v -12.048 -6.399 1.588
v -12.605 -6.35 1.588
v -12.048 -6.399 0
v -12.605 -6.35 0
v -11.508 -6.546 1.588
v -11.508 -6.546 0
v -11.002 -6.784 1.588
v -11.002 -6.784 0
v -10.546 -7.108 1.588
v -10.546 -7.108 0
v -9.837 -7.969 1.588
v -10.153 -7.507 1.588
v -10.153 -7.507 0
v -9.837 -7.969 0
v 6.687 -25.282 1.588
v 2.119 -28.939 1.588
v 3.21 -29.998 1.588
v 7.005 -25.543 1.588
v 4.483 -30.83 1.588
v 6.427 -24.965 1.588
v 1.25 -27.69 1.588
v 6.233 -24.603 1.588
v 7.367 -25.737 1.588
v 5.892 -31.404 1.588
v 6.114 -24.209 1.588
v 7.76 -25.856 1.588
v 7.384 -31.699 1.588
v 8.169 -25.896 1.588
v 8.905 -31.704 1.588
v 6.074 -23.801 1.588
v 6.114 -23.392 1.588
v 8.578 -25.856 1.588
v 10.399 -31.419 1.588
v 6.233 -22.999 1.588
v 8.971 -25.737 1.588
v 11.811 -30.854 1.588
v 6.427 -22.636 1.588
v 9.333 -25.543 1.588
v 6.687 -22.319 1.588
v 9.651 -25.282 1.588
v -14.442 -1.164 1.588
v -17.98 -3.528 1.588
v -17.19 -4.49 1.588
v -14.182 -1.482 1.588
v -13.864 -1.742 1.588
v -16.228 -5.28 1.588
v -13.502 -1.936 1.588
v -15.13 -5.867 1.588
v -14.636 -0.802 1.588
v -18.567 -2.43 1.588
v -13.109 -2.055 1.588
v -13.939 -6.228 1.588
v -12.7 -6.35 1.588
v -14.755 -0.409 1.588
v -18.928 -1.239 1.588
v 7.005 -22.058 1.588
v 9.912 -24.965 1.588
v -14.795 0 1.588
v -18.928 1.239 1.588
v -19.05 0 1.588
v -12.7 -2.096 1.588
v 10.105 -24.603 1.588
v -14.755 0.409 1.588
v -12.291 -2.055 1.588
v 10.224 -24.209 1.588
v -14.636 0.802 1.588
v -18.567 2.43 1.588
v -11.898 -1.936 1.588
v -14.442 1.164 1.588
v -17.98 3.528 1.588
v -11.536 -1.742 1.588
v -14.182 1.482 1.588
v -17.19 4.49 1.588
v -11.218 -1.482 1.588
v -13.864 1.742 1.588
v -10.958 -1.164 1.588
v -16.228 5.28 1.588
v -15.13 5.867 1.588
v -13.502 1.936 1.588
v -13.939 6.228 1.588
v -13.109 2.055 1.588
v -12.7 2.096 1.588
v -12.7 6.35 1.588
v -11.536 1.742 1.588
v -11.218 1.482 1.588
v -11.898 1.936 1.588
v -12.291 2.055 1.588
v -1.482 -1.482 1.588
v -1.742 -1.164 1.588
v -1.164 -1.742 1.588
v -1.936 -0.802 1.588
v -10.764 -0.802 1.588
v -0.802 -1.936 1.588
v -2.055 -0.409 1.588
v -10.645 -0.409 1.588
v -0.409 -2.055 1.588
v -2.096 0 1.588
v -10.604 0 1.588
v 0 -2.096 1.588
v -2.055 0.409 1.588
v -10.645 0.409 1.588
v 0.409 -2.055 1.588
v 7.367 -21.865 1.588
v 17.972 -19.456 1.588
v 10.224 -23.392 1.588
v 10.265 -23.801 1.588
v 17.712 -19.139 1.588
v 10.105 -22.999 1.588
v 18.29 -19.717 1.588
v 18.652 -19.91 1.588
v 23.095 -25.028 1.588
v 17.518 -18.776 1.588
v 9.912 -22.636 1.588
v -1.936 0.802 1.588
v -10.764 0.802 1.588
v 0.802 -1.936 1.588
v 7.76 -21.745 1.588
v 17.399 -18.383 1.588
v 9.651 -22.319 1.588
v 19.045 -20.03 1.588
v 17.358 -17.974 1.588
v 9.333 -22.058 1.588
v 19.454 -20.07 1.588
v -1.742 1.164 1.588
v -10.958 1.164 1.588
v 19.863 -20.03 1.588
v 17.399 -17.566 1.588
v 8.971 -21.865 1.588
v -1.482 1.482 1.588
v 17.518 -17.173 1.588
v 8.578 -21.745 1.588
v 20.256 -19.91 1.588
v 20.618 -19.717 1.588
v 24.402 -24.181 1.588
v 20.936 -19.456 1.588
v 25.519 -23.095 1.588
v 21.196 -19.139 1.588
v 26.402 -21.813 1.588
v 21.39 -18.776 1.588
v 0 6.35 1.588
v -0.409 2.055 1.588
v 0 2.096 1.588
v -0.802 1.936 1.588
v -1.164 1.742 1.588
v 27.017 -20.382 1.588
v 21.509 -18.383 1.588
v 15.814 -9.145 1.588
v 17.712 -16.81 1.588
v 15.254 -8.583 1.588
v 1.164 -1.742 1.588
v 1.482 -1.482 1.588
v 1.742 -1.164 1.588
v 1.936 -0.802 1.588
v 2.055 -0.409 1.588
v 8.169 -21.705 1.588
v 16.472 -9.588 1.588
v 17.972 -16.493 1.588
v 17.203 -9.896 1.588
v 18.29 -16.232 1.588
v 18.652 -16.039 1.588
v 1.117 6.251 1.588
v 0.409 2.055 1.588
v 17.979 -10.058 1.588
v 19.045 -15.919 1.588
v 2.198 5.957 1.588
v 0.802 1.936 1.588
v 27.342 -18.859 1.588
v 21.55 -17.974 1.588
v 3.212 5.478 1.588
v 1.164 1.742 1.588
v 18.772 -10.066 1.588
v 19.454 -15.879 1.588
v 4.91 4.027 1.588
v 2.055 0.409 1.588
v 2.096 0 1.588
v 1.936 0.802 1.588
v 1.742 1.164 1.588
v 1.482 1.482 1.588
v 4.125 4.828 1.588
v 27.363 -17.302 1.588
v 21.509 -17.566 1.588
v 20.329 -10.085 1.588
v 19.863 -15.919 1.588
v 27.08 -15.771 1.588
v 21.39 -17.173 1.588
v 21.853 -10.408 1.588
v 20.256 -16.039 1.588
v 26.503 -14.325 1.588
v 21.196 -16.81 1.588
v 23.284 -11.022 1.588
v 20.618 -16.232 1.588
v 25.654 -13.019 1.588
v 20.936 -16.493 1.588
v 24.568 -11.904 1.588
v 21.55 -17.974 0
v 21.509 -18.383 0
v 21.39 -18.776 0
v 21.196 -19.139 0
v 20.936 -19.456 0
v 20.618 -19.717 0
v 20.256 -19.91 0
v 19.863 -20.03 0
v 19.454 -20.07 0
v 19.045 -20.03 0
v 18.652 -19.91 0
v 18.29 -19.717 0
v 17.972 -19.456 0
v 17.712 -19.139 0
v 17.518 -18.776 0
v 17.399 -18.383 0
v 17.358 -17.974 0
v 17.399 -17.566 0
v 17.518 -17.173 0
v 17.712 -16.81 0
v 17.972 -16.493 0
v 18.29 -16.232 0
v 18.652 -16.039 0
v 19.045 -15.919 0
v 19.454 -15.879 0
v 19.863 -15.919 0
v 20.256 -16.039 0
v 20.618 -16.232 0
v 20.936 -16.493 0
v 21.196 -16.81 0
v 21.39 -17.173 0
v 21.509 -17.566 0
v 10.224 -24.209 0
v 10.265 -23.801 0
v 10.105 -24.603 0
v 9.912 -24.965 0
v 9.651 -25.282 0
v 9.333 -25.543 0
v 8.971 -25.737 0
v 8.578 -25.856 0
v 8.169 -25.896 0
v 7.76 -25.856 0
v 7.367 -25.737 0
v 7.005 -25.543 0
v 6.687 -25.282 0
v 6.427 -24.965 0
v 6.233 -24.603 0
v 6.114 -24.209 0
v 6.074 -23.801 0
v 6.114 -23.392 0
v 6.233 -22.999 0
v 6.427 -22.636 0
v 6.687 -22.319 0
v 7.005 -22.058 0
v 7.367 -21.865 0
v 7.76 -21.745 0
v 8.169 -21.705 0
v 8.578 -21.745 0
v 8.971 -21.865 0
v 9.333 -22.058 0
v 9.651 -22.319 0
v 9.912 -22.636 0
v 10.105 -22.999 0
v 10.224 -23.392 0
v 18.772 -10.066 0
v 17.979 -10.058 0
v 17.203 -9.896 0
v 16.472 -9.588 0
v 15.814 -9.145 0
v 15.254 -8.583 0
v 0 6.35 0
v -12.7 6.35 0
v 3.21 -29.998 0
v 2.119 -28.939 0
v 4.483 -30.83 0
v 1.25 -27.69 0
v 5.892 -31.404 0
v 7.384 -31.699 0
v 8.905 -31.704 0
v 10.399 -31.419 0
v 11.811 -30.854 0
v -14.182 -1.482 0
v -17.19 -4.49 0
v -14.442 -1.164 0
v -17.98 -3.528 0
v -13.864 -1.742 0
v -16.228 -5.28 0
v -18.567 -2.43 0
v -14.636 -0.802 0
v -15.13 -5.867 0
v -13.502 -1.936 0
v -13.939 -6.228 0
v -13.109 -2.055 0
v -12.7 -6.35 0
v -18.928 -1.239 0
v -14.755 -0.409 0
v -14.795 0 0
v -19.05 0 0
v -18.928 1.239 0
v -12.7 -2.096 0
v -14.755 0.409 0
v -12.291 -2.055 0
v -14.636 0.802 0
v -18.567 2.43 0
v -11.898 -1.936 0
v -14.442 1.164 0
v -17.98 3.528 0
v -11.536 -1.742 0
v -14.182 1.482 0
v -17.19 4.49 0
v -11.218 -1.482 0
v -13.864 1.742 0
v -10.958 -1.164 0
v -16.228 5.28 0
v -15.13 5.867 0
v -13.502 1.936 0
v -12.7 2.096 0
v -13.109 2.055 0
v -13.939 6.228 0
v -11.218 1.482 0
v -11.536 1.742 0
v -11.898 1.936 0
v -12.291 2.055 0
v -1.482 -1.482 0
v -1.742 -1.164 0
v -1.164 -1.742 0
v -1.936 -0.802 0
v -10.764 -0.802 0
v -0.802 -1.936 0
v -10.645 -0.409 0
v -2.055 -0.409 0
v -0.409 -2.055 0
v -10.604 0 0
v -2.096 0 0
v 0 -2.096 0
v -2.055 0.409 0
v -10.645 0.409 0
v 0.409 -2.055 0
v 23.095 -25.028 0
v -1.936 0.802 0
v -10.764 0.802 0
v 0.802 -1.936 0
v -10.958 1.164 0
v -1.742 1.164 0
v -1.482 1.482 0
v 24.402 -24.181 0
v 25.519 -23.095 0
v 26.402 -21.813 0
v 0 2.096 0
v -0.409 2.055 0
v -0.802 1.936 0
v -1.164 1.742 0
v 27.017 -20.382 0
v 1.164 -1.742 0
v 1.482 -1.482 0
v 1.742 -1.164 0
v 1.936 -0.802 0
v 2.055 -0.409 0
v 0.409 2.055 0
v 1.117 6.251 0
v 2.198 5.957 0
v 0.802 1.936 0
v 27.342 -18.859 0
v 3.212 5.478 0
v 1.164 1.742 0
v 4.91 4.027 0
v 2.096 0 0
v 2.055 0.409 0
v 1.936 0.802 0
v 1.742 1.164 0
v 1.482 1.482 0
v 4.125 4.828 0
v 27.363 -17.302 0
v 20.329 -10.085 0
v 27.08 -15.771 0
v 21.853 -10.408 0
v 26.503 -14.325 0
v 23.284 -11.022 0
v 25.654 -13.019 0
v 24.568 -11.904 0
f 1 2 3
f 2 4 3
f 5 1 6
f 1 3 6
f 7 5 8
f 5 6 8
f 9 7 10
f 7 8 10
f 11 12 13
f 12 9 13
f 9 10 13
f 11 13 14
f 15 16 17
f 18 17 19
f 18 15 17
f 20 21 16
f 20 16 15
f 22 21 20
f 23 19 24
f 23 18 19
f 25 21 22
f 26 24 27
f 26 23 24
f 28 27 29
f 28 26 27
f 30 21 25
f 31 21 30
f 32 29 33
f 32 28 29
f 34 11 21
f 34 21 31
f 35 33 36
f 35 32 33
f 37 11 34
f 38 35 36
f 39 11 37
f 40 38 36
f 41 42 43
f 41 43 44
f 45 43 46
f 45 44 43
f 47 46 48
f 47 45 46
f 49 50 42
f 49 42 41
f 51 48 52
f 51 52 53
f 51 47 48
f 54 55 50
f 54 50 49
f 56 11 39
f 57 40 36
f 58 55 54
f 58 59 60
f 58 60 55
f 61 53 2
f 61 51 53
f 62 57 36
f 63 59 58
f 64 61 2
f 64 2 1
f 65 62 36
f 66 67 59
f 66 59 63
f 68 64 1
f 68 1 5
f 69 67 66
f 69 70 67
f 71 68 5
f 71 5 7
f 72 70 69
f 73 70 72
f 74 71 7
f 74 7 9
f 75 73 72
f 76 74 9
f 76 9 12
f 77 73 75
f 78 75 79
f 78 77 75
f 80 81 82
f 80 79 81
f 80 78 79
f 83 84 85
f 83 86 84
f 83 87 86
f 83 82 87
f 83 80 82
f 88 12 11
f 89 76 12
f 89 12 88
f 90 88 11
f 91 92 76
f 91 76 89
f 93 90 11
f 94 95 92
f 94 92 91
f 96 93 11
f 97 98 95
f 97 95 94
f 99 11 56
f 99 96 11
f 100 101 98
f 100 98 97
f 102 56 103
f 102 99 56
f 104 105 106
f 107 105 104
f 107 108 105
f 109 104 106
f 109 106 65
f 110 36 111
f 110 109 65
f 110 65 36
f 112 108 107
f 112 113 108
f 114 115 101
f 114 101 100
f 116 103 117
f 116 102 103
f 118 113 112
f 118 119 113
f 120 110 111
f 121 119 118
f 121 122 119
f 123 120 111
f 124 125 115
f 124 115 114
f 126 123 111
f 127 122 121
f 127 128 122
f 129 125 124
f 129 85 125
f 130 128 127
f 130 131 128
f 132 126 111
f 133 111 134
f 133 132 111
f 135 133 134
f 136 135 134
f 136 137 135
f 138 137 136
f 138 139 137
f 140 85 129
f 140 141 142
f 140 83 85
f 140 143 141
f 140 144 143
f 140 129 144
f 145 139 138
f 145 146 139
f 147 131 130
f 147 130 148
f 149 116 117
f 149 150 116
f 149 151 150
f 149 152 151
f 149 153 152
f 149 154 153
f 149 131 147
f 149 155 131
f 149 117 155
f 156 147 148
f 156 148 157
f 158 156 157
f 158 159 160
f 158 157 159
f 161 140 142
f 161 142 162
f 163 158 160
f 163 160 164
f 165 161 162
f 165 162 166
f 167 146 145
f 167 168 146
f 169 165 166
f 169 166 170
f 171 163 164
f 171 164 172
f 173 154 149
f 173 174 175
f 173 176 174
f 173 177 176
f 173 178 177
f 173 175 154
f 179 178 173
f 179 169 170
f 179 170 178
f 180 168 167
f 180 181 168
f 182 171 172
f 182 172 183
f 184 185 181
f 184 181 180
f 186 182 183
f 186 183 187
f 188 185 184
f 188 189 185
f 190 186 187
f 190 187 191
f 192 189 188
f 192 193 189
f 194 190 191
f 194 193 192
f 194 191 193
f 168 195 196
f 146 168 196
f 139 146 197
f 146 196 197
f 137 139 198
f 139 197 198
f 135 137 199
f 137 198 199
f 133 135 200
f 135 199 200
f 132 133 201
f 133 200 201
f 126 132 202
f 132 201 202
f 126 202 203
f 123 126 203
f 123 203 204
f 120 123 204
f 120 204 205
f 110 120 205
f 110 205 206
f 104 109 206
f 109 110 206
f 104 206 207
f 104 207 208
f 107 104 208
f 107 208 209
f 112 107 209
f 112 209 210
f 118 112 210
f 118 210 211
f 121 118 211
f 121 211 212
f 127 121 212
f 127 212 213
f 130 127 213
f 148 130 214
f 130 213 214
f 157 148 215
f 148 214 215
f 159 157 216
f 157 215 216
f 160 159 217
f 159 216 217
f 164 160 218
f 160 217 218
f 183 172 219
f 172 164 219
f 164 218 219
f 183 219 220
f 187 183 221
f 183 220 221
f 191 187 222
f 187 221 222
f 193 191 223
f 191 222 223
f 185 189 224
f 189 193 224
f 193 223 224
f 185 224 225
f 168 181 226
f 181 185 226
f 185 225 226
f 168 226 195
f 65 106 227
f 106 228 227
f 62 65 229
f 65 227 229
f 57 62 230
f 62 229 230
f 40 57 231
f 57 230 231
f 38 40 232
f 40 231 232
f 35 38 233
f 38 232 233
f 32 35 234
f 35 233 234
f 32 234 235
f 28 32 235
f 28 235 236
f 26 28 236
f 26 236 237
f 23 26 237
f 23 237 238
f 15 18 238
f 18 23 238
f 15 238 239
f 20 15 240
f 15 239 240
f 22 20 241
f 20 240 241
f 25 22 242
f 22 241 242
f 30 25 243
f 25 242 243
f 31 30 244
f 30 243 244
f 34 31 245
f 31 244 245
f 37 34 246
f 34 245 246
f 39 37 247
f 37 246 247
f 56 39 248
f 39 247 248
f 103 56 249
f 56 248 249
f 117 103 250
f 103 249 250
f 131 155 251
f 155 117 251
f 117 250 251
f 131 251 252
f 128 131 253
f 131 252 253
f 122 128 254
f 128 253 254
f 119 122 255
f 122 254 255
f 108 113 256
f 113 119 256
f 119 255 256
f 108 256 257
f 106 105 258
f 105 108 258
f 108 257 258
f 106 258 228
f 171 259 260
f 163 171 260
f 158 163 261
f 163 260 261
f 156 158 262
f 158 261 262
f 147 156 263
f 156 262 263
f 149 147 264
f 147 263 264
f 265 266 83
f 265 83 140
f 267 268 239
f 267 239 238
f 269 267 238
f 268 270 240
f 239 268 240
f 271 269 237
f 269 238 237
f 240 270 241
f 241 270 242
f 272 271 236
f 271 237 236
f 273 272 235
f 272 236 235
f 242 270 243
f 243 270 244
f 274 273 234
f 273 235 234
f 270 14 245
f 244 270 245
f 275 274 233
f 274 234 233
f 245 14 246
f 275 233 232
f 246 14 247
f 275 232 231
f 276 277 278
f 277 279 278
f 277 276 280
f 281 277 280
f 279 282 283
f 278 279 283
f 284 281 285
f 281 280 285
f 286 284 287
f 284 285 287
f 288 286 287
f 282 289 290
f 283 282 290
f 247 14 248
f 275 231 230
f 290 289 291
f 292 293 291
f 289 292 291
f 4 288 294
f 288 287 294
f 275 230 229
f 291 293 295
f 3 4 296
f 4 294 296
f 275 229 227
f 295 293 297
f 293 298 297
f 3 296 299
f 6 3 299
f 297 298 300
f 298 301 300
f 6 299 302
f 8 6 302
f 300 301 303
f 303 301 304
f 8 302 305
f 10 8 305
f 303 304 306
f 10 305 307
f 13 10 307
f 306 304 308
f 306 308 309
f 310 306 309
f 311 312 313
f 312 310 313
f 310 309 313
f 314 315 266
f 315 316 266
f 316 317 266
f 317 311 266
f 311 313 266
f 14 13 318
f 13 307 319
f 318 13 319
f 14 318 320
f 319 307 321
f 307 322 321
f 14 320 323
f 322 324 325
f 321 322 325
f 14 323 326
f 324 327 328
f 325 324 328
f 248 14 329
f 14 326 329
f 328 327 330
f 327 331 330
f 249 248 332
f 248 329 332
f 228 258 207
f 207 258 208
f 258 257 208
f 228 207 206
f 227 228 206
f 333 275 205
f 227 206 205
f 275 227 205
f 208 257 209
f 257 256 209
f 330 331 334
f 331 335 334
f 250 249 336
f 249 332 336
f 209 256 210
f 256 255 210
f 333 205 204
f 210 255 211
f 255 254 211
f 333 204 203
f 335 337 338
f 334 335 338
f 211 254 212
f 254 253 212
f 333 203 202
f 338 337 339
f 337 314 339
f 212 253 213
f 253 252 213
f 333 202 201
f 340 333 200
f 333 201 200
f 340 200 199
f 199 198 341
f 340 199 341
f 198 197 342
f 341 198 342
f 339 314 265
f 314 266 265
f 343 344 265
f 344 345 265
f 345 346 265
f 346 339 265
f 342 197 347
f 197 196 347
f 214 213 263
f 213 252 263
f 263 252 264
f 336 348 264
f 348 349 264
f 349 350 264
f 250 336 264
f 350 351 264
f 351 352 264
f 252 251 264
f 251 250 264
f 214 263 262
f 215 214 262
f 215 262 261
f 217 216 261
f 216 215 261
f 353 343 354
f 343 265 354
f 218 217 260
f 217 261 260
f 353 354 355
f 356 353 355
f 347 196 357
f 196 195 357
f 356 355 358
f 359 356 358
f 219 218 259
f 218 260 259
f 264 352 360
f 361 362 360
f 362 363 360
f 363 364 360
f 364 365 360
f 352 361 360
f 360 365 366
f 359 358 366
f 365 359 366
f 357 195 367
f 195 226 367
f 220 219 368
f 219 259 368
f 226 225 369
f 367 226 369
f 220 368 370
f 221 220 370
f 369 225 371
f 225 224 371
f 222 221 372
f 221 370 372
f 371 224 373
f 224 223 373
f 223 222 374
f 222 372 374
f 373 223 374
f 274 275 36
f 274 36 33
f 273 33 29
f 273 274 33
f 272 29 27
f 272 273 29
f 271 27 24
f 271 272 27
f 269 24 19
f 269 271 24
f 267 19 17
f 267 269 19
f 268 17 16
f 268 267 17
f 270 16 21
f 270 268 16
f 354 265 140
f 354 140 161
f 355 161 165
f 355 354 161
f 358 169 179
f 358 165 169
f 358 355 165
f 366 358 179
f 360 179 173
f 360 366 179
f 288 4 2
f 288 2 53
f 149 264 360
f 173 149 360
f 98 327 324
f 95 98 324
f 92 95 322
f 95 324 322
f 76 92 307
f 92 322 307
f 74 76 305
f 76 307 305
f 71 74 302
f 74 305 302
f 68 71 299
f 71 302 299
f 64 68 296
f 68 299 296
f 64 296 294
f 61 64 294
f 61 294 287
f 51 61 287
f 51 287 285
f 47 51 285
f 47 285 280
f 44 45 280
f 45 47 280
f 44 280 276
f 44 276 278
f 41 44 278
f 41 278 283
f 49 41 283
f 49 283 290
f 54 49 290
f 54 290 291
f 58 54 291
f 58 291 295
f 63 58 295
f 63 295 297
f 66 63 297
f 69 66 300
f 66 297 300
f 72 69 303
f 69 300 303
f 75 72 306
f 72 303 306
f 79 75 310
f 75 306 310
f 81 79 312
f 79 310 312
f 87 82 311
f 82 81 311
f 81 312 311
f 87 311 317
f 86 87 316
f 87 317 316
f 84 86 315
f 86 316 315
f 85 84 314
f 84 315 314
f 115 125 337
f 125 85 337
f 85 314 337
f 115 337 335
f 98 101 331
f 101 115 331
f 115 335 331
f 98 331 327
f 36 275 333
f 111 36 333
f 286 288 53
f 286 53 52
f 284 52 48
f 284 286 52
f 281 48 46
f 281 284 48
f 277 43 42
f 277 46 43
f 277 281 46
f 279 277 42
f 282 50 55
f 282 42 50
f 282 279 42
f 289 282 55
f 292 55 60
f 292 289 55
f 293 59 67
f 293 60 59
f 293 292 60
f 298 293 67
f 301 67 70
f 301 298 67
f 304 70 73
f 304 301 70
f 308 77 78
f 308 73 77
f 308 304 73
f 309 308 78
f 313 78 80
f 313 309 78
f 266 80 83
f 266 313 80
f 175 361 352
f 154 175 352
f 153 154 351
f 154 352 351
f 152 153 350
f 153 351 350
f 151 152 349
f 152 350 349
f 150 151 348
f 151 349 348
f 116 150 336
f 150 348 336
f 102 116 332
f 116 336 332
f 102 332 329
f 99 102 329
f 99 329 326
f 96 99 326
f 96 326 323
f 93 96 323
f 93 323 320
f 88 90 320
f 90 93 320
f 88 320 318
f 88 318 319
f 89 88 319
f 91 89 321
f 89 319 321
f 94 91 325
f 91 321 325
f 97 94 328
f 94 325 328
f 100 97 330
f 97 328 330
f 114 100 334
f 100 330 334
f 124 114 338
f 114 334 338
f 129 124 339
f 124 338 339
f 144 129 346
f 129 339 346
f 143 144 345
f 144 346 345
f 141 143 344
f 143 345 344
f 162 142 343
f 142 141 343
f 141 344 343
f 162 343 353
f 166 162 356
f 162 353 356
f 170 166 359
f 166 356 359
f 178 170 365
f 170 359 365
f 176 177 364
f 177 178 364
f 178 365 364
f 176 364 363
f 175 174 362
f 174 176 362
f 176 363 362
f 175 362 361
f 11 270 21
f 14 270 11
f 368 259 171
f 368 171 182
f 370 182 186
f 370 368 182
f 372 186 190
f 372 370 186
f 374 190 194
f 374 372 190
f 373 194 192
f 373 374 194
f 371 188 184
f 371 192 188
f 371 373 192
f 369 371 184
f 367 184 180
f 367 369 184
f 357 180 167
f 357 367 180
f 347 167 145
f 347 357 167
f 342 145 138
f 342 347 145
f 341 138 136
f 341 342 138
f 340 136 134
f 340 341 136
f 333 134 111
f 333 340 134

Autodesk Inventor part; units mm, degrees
ref_plane "YZ Plane" through (0, 0, 0) normal (1, 0, 0) x (0, 1, 0)
ref_plane "XZ Plane" through (0, 0, 0) normal (0, 1, 0) x (-1, 0, 0)
ref_plane "XY Plane" through (0, 0, 0) normal (0, 0, 1) x (1, 0, 0)
sketch "Sketch1" plane through (0, 0, 0) normal (0, 0, 1) x (1, 0, 0)
  circle A0 centre (0, 0) radius 2.0955
  circle A1 centre (-12.7, 0) radius 2.0955
  arc A2 (-12.7, 6.35) -> (-12.7, -6.35) centre (-12.7, 0) ccw
  arc A3 (4.9096, 4.0272) -> (0, 6.35) centre (0, 0) ccw
  line L0 (0, 0) -> (32.8335, 0) construction
  line L1 (-12.6049, -6.35) -> (-12.7, -6.35)
  line L2 (-12.7, 6.35) -> (0, 6.35)
  line L3 (1.2503, -27.6905) -> (-9.8373, -7.969)
  arc A4 (-9.8373, -7.969) -> (-12.6049, -6.35) centre (-12.6049, -9.525) ccw
  arc A5 (1.2503, -27.6905) -> (11.8106, -30.8536) centre (8.1692, -23.8006) ccw
  circle A6 centre (8.1692, -23.8006) radius 2.0955
  circle A7 centre (19.454, -17.9745) radius 2.0955
  arc A8 (23.0953, -25.0275) -> (18.7723, -10.0663) centre (19.454, -17.9745) ccw
  line L4 (11.8106, -30.8536) -> (23.0953, -25.0275)
  arc A9 (15.2536, -8.5832) -> (18.7723, -10.0663) centre (18.4204, -5.9855) ccw
  line L5 (15.2536, -8.5832) -> (4.9096, 4.0272)
  point P0 (-10.4687, -6.35)
  dimension "d0" = 4.191
  dimension "d9" = 3.175
  dimension "d10" = 7.9375
  dimension "d11" = 4.191
  dimension "d13" = 4.191
  dimension "d14" = 15.875
  dimension "d15" = 12.7
extrude "Extrusion1" add sketch "Sketch1" along normal blind 1.5875
properties part number "Clamp Gusset" material "Acetal Resin, White"
